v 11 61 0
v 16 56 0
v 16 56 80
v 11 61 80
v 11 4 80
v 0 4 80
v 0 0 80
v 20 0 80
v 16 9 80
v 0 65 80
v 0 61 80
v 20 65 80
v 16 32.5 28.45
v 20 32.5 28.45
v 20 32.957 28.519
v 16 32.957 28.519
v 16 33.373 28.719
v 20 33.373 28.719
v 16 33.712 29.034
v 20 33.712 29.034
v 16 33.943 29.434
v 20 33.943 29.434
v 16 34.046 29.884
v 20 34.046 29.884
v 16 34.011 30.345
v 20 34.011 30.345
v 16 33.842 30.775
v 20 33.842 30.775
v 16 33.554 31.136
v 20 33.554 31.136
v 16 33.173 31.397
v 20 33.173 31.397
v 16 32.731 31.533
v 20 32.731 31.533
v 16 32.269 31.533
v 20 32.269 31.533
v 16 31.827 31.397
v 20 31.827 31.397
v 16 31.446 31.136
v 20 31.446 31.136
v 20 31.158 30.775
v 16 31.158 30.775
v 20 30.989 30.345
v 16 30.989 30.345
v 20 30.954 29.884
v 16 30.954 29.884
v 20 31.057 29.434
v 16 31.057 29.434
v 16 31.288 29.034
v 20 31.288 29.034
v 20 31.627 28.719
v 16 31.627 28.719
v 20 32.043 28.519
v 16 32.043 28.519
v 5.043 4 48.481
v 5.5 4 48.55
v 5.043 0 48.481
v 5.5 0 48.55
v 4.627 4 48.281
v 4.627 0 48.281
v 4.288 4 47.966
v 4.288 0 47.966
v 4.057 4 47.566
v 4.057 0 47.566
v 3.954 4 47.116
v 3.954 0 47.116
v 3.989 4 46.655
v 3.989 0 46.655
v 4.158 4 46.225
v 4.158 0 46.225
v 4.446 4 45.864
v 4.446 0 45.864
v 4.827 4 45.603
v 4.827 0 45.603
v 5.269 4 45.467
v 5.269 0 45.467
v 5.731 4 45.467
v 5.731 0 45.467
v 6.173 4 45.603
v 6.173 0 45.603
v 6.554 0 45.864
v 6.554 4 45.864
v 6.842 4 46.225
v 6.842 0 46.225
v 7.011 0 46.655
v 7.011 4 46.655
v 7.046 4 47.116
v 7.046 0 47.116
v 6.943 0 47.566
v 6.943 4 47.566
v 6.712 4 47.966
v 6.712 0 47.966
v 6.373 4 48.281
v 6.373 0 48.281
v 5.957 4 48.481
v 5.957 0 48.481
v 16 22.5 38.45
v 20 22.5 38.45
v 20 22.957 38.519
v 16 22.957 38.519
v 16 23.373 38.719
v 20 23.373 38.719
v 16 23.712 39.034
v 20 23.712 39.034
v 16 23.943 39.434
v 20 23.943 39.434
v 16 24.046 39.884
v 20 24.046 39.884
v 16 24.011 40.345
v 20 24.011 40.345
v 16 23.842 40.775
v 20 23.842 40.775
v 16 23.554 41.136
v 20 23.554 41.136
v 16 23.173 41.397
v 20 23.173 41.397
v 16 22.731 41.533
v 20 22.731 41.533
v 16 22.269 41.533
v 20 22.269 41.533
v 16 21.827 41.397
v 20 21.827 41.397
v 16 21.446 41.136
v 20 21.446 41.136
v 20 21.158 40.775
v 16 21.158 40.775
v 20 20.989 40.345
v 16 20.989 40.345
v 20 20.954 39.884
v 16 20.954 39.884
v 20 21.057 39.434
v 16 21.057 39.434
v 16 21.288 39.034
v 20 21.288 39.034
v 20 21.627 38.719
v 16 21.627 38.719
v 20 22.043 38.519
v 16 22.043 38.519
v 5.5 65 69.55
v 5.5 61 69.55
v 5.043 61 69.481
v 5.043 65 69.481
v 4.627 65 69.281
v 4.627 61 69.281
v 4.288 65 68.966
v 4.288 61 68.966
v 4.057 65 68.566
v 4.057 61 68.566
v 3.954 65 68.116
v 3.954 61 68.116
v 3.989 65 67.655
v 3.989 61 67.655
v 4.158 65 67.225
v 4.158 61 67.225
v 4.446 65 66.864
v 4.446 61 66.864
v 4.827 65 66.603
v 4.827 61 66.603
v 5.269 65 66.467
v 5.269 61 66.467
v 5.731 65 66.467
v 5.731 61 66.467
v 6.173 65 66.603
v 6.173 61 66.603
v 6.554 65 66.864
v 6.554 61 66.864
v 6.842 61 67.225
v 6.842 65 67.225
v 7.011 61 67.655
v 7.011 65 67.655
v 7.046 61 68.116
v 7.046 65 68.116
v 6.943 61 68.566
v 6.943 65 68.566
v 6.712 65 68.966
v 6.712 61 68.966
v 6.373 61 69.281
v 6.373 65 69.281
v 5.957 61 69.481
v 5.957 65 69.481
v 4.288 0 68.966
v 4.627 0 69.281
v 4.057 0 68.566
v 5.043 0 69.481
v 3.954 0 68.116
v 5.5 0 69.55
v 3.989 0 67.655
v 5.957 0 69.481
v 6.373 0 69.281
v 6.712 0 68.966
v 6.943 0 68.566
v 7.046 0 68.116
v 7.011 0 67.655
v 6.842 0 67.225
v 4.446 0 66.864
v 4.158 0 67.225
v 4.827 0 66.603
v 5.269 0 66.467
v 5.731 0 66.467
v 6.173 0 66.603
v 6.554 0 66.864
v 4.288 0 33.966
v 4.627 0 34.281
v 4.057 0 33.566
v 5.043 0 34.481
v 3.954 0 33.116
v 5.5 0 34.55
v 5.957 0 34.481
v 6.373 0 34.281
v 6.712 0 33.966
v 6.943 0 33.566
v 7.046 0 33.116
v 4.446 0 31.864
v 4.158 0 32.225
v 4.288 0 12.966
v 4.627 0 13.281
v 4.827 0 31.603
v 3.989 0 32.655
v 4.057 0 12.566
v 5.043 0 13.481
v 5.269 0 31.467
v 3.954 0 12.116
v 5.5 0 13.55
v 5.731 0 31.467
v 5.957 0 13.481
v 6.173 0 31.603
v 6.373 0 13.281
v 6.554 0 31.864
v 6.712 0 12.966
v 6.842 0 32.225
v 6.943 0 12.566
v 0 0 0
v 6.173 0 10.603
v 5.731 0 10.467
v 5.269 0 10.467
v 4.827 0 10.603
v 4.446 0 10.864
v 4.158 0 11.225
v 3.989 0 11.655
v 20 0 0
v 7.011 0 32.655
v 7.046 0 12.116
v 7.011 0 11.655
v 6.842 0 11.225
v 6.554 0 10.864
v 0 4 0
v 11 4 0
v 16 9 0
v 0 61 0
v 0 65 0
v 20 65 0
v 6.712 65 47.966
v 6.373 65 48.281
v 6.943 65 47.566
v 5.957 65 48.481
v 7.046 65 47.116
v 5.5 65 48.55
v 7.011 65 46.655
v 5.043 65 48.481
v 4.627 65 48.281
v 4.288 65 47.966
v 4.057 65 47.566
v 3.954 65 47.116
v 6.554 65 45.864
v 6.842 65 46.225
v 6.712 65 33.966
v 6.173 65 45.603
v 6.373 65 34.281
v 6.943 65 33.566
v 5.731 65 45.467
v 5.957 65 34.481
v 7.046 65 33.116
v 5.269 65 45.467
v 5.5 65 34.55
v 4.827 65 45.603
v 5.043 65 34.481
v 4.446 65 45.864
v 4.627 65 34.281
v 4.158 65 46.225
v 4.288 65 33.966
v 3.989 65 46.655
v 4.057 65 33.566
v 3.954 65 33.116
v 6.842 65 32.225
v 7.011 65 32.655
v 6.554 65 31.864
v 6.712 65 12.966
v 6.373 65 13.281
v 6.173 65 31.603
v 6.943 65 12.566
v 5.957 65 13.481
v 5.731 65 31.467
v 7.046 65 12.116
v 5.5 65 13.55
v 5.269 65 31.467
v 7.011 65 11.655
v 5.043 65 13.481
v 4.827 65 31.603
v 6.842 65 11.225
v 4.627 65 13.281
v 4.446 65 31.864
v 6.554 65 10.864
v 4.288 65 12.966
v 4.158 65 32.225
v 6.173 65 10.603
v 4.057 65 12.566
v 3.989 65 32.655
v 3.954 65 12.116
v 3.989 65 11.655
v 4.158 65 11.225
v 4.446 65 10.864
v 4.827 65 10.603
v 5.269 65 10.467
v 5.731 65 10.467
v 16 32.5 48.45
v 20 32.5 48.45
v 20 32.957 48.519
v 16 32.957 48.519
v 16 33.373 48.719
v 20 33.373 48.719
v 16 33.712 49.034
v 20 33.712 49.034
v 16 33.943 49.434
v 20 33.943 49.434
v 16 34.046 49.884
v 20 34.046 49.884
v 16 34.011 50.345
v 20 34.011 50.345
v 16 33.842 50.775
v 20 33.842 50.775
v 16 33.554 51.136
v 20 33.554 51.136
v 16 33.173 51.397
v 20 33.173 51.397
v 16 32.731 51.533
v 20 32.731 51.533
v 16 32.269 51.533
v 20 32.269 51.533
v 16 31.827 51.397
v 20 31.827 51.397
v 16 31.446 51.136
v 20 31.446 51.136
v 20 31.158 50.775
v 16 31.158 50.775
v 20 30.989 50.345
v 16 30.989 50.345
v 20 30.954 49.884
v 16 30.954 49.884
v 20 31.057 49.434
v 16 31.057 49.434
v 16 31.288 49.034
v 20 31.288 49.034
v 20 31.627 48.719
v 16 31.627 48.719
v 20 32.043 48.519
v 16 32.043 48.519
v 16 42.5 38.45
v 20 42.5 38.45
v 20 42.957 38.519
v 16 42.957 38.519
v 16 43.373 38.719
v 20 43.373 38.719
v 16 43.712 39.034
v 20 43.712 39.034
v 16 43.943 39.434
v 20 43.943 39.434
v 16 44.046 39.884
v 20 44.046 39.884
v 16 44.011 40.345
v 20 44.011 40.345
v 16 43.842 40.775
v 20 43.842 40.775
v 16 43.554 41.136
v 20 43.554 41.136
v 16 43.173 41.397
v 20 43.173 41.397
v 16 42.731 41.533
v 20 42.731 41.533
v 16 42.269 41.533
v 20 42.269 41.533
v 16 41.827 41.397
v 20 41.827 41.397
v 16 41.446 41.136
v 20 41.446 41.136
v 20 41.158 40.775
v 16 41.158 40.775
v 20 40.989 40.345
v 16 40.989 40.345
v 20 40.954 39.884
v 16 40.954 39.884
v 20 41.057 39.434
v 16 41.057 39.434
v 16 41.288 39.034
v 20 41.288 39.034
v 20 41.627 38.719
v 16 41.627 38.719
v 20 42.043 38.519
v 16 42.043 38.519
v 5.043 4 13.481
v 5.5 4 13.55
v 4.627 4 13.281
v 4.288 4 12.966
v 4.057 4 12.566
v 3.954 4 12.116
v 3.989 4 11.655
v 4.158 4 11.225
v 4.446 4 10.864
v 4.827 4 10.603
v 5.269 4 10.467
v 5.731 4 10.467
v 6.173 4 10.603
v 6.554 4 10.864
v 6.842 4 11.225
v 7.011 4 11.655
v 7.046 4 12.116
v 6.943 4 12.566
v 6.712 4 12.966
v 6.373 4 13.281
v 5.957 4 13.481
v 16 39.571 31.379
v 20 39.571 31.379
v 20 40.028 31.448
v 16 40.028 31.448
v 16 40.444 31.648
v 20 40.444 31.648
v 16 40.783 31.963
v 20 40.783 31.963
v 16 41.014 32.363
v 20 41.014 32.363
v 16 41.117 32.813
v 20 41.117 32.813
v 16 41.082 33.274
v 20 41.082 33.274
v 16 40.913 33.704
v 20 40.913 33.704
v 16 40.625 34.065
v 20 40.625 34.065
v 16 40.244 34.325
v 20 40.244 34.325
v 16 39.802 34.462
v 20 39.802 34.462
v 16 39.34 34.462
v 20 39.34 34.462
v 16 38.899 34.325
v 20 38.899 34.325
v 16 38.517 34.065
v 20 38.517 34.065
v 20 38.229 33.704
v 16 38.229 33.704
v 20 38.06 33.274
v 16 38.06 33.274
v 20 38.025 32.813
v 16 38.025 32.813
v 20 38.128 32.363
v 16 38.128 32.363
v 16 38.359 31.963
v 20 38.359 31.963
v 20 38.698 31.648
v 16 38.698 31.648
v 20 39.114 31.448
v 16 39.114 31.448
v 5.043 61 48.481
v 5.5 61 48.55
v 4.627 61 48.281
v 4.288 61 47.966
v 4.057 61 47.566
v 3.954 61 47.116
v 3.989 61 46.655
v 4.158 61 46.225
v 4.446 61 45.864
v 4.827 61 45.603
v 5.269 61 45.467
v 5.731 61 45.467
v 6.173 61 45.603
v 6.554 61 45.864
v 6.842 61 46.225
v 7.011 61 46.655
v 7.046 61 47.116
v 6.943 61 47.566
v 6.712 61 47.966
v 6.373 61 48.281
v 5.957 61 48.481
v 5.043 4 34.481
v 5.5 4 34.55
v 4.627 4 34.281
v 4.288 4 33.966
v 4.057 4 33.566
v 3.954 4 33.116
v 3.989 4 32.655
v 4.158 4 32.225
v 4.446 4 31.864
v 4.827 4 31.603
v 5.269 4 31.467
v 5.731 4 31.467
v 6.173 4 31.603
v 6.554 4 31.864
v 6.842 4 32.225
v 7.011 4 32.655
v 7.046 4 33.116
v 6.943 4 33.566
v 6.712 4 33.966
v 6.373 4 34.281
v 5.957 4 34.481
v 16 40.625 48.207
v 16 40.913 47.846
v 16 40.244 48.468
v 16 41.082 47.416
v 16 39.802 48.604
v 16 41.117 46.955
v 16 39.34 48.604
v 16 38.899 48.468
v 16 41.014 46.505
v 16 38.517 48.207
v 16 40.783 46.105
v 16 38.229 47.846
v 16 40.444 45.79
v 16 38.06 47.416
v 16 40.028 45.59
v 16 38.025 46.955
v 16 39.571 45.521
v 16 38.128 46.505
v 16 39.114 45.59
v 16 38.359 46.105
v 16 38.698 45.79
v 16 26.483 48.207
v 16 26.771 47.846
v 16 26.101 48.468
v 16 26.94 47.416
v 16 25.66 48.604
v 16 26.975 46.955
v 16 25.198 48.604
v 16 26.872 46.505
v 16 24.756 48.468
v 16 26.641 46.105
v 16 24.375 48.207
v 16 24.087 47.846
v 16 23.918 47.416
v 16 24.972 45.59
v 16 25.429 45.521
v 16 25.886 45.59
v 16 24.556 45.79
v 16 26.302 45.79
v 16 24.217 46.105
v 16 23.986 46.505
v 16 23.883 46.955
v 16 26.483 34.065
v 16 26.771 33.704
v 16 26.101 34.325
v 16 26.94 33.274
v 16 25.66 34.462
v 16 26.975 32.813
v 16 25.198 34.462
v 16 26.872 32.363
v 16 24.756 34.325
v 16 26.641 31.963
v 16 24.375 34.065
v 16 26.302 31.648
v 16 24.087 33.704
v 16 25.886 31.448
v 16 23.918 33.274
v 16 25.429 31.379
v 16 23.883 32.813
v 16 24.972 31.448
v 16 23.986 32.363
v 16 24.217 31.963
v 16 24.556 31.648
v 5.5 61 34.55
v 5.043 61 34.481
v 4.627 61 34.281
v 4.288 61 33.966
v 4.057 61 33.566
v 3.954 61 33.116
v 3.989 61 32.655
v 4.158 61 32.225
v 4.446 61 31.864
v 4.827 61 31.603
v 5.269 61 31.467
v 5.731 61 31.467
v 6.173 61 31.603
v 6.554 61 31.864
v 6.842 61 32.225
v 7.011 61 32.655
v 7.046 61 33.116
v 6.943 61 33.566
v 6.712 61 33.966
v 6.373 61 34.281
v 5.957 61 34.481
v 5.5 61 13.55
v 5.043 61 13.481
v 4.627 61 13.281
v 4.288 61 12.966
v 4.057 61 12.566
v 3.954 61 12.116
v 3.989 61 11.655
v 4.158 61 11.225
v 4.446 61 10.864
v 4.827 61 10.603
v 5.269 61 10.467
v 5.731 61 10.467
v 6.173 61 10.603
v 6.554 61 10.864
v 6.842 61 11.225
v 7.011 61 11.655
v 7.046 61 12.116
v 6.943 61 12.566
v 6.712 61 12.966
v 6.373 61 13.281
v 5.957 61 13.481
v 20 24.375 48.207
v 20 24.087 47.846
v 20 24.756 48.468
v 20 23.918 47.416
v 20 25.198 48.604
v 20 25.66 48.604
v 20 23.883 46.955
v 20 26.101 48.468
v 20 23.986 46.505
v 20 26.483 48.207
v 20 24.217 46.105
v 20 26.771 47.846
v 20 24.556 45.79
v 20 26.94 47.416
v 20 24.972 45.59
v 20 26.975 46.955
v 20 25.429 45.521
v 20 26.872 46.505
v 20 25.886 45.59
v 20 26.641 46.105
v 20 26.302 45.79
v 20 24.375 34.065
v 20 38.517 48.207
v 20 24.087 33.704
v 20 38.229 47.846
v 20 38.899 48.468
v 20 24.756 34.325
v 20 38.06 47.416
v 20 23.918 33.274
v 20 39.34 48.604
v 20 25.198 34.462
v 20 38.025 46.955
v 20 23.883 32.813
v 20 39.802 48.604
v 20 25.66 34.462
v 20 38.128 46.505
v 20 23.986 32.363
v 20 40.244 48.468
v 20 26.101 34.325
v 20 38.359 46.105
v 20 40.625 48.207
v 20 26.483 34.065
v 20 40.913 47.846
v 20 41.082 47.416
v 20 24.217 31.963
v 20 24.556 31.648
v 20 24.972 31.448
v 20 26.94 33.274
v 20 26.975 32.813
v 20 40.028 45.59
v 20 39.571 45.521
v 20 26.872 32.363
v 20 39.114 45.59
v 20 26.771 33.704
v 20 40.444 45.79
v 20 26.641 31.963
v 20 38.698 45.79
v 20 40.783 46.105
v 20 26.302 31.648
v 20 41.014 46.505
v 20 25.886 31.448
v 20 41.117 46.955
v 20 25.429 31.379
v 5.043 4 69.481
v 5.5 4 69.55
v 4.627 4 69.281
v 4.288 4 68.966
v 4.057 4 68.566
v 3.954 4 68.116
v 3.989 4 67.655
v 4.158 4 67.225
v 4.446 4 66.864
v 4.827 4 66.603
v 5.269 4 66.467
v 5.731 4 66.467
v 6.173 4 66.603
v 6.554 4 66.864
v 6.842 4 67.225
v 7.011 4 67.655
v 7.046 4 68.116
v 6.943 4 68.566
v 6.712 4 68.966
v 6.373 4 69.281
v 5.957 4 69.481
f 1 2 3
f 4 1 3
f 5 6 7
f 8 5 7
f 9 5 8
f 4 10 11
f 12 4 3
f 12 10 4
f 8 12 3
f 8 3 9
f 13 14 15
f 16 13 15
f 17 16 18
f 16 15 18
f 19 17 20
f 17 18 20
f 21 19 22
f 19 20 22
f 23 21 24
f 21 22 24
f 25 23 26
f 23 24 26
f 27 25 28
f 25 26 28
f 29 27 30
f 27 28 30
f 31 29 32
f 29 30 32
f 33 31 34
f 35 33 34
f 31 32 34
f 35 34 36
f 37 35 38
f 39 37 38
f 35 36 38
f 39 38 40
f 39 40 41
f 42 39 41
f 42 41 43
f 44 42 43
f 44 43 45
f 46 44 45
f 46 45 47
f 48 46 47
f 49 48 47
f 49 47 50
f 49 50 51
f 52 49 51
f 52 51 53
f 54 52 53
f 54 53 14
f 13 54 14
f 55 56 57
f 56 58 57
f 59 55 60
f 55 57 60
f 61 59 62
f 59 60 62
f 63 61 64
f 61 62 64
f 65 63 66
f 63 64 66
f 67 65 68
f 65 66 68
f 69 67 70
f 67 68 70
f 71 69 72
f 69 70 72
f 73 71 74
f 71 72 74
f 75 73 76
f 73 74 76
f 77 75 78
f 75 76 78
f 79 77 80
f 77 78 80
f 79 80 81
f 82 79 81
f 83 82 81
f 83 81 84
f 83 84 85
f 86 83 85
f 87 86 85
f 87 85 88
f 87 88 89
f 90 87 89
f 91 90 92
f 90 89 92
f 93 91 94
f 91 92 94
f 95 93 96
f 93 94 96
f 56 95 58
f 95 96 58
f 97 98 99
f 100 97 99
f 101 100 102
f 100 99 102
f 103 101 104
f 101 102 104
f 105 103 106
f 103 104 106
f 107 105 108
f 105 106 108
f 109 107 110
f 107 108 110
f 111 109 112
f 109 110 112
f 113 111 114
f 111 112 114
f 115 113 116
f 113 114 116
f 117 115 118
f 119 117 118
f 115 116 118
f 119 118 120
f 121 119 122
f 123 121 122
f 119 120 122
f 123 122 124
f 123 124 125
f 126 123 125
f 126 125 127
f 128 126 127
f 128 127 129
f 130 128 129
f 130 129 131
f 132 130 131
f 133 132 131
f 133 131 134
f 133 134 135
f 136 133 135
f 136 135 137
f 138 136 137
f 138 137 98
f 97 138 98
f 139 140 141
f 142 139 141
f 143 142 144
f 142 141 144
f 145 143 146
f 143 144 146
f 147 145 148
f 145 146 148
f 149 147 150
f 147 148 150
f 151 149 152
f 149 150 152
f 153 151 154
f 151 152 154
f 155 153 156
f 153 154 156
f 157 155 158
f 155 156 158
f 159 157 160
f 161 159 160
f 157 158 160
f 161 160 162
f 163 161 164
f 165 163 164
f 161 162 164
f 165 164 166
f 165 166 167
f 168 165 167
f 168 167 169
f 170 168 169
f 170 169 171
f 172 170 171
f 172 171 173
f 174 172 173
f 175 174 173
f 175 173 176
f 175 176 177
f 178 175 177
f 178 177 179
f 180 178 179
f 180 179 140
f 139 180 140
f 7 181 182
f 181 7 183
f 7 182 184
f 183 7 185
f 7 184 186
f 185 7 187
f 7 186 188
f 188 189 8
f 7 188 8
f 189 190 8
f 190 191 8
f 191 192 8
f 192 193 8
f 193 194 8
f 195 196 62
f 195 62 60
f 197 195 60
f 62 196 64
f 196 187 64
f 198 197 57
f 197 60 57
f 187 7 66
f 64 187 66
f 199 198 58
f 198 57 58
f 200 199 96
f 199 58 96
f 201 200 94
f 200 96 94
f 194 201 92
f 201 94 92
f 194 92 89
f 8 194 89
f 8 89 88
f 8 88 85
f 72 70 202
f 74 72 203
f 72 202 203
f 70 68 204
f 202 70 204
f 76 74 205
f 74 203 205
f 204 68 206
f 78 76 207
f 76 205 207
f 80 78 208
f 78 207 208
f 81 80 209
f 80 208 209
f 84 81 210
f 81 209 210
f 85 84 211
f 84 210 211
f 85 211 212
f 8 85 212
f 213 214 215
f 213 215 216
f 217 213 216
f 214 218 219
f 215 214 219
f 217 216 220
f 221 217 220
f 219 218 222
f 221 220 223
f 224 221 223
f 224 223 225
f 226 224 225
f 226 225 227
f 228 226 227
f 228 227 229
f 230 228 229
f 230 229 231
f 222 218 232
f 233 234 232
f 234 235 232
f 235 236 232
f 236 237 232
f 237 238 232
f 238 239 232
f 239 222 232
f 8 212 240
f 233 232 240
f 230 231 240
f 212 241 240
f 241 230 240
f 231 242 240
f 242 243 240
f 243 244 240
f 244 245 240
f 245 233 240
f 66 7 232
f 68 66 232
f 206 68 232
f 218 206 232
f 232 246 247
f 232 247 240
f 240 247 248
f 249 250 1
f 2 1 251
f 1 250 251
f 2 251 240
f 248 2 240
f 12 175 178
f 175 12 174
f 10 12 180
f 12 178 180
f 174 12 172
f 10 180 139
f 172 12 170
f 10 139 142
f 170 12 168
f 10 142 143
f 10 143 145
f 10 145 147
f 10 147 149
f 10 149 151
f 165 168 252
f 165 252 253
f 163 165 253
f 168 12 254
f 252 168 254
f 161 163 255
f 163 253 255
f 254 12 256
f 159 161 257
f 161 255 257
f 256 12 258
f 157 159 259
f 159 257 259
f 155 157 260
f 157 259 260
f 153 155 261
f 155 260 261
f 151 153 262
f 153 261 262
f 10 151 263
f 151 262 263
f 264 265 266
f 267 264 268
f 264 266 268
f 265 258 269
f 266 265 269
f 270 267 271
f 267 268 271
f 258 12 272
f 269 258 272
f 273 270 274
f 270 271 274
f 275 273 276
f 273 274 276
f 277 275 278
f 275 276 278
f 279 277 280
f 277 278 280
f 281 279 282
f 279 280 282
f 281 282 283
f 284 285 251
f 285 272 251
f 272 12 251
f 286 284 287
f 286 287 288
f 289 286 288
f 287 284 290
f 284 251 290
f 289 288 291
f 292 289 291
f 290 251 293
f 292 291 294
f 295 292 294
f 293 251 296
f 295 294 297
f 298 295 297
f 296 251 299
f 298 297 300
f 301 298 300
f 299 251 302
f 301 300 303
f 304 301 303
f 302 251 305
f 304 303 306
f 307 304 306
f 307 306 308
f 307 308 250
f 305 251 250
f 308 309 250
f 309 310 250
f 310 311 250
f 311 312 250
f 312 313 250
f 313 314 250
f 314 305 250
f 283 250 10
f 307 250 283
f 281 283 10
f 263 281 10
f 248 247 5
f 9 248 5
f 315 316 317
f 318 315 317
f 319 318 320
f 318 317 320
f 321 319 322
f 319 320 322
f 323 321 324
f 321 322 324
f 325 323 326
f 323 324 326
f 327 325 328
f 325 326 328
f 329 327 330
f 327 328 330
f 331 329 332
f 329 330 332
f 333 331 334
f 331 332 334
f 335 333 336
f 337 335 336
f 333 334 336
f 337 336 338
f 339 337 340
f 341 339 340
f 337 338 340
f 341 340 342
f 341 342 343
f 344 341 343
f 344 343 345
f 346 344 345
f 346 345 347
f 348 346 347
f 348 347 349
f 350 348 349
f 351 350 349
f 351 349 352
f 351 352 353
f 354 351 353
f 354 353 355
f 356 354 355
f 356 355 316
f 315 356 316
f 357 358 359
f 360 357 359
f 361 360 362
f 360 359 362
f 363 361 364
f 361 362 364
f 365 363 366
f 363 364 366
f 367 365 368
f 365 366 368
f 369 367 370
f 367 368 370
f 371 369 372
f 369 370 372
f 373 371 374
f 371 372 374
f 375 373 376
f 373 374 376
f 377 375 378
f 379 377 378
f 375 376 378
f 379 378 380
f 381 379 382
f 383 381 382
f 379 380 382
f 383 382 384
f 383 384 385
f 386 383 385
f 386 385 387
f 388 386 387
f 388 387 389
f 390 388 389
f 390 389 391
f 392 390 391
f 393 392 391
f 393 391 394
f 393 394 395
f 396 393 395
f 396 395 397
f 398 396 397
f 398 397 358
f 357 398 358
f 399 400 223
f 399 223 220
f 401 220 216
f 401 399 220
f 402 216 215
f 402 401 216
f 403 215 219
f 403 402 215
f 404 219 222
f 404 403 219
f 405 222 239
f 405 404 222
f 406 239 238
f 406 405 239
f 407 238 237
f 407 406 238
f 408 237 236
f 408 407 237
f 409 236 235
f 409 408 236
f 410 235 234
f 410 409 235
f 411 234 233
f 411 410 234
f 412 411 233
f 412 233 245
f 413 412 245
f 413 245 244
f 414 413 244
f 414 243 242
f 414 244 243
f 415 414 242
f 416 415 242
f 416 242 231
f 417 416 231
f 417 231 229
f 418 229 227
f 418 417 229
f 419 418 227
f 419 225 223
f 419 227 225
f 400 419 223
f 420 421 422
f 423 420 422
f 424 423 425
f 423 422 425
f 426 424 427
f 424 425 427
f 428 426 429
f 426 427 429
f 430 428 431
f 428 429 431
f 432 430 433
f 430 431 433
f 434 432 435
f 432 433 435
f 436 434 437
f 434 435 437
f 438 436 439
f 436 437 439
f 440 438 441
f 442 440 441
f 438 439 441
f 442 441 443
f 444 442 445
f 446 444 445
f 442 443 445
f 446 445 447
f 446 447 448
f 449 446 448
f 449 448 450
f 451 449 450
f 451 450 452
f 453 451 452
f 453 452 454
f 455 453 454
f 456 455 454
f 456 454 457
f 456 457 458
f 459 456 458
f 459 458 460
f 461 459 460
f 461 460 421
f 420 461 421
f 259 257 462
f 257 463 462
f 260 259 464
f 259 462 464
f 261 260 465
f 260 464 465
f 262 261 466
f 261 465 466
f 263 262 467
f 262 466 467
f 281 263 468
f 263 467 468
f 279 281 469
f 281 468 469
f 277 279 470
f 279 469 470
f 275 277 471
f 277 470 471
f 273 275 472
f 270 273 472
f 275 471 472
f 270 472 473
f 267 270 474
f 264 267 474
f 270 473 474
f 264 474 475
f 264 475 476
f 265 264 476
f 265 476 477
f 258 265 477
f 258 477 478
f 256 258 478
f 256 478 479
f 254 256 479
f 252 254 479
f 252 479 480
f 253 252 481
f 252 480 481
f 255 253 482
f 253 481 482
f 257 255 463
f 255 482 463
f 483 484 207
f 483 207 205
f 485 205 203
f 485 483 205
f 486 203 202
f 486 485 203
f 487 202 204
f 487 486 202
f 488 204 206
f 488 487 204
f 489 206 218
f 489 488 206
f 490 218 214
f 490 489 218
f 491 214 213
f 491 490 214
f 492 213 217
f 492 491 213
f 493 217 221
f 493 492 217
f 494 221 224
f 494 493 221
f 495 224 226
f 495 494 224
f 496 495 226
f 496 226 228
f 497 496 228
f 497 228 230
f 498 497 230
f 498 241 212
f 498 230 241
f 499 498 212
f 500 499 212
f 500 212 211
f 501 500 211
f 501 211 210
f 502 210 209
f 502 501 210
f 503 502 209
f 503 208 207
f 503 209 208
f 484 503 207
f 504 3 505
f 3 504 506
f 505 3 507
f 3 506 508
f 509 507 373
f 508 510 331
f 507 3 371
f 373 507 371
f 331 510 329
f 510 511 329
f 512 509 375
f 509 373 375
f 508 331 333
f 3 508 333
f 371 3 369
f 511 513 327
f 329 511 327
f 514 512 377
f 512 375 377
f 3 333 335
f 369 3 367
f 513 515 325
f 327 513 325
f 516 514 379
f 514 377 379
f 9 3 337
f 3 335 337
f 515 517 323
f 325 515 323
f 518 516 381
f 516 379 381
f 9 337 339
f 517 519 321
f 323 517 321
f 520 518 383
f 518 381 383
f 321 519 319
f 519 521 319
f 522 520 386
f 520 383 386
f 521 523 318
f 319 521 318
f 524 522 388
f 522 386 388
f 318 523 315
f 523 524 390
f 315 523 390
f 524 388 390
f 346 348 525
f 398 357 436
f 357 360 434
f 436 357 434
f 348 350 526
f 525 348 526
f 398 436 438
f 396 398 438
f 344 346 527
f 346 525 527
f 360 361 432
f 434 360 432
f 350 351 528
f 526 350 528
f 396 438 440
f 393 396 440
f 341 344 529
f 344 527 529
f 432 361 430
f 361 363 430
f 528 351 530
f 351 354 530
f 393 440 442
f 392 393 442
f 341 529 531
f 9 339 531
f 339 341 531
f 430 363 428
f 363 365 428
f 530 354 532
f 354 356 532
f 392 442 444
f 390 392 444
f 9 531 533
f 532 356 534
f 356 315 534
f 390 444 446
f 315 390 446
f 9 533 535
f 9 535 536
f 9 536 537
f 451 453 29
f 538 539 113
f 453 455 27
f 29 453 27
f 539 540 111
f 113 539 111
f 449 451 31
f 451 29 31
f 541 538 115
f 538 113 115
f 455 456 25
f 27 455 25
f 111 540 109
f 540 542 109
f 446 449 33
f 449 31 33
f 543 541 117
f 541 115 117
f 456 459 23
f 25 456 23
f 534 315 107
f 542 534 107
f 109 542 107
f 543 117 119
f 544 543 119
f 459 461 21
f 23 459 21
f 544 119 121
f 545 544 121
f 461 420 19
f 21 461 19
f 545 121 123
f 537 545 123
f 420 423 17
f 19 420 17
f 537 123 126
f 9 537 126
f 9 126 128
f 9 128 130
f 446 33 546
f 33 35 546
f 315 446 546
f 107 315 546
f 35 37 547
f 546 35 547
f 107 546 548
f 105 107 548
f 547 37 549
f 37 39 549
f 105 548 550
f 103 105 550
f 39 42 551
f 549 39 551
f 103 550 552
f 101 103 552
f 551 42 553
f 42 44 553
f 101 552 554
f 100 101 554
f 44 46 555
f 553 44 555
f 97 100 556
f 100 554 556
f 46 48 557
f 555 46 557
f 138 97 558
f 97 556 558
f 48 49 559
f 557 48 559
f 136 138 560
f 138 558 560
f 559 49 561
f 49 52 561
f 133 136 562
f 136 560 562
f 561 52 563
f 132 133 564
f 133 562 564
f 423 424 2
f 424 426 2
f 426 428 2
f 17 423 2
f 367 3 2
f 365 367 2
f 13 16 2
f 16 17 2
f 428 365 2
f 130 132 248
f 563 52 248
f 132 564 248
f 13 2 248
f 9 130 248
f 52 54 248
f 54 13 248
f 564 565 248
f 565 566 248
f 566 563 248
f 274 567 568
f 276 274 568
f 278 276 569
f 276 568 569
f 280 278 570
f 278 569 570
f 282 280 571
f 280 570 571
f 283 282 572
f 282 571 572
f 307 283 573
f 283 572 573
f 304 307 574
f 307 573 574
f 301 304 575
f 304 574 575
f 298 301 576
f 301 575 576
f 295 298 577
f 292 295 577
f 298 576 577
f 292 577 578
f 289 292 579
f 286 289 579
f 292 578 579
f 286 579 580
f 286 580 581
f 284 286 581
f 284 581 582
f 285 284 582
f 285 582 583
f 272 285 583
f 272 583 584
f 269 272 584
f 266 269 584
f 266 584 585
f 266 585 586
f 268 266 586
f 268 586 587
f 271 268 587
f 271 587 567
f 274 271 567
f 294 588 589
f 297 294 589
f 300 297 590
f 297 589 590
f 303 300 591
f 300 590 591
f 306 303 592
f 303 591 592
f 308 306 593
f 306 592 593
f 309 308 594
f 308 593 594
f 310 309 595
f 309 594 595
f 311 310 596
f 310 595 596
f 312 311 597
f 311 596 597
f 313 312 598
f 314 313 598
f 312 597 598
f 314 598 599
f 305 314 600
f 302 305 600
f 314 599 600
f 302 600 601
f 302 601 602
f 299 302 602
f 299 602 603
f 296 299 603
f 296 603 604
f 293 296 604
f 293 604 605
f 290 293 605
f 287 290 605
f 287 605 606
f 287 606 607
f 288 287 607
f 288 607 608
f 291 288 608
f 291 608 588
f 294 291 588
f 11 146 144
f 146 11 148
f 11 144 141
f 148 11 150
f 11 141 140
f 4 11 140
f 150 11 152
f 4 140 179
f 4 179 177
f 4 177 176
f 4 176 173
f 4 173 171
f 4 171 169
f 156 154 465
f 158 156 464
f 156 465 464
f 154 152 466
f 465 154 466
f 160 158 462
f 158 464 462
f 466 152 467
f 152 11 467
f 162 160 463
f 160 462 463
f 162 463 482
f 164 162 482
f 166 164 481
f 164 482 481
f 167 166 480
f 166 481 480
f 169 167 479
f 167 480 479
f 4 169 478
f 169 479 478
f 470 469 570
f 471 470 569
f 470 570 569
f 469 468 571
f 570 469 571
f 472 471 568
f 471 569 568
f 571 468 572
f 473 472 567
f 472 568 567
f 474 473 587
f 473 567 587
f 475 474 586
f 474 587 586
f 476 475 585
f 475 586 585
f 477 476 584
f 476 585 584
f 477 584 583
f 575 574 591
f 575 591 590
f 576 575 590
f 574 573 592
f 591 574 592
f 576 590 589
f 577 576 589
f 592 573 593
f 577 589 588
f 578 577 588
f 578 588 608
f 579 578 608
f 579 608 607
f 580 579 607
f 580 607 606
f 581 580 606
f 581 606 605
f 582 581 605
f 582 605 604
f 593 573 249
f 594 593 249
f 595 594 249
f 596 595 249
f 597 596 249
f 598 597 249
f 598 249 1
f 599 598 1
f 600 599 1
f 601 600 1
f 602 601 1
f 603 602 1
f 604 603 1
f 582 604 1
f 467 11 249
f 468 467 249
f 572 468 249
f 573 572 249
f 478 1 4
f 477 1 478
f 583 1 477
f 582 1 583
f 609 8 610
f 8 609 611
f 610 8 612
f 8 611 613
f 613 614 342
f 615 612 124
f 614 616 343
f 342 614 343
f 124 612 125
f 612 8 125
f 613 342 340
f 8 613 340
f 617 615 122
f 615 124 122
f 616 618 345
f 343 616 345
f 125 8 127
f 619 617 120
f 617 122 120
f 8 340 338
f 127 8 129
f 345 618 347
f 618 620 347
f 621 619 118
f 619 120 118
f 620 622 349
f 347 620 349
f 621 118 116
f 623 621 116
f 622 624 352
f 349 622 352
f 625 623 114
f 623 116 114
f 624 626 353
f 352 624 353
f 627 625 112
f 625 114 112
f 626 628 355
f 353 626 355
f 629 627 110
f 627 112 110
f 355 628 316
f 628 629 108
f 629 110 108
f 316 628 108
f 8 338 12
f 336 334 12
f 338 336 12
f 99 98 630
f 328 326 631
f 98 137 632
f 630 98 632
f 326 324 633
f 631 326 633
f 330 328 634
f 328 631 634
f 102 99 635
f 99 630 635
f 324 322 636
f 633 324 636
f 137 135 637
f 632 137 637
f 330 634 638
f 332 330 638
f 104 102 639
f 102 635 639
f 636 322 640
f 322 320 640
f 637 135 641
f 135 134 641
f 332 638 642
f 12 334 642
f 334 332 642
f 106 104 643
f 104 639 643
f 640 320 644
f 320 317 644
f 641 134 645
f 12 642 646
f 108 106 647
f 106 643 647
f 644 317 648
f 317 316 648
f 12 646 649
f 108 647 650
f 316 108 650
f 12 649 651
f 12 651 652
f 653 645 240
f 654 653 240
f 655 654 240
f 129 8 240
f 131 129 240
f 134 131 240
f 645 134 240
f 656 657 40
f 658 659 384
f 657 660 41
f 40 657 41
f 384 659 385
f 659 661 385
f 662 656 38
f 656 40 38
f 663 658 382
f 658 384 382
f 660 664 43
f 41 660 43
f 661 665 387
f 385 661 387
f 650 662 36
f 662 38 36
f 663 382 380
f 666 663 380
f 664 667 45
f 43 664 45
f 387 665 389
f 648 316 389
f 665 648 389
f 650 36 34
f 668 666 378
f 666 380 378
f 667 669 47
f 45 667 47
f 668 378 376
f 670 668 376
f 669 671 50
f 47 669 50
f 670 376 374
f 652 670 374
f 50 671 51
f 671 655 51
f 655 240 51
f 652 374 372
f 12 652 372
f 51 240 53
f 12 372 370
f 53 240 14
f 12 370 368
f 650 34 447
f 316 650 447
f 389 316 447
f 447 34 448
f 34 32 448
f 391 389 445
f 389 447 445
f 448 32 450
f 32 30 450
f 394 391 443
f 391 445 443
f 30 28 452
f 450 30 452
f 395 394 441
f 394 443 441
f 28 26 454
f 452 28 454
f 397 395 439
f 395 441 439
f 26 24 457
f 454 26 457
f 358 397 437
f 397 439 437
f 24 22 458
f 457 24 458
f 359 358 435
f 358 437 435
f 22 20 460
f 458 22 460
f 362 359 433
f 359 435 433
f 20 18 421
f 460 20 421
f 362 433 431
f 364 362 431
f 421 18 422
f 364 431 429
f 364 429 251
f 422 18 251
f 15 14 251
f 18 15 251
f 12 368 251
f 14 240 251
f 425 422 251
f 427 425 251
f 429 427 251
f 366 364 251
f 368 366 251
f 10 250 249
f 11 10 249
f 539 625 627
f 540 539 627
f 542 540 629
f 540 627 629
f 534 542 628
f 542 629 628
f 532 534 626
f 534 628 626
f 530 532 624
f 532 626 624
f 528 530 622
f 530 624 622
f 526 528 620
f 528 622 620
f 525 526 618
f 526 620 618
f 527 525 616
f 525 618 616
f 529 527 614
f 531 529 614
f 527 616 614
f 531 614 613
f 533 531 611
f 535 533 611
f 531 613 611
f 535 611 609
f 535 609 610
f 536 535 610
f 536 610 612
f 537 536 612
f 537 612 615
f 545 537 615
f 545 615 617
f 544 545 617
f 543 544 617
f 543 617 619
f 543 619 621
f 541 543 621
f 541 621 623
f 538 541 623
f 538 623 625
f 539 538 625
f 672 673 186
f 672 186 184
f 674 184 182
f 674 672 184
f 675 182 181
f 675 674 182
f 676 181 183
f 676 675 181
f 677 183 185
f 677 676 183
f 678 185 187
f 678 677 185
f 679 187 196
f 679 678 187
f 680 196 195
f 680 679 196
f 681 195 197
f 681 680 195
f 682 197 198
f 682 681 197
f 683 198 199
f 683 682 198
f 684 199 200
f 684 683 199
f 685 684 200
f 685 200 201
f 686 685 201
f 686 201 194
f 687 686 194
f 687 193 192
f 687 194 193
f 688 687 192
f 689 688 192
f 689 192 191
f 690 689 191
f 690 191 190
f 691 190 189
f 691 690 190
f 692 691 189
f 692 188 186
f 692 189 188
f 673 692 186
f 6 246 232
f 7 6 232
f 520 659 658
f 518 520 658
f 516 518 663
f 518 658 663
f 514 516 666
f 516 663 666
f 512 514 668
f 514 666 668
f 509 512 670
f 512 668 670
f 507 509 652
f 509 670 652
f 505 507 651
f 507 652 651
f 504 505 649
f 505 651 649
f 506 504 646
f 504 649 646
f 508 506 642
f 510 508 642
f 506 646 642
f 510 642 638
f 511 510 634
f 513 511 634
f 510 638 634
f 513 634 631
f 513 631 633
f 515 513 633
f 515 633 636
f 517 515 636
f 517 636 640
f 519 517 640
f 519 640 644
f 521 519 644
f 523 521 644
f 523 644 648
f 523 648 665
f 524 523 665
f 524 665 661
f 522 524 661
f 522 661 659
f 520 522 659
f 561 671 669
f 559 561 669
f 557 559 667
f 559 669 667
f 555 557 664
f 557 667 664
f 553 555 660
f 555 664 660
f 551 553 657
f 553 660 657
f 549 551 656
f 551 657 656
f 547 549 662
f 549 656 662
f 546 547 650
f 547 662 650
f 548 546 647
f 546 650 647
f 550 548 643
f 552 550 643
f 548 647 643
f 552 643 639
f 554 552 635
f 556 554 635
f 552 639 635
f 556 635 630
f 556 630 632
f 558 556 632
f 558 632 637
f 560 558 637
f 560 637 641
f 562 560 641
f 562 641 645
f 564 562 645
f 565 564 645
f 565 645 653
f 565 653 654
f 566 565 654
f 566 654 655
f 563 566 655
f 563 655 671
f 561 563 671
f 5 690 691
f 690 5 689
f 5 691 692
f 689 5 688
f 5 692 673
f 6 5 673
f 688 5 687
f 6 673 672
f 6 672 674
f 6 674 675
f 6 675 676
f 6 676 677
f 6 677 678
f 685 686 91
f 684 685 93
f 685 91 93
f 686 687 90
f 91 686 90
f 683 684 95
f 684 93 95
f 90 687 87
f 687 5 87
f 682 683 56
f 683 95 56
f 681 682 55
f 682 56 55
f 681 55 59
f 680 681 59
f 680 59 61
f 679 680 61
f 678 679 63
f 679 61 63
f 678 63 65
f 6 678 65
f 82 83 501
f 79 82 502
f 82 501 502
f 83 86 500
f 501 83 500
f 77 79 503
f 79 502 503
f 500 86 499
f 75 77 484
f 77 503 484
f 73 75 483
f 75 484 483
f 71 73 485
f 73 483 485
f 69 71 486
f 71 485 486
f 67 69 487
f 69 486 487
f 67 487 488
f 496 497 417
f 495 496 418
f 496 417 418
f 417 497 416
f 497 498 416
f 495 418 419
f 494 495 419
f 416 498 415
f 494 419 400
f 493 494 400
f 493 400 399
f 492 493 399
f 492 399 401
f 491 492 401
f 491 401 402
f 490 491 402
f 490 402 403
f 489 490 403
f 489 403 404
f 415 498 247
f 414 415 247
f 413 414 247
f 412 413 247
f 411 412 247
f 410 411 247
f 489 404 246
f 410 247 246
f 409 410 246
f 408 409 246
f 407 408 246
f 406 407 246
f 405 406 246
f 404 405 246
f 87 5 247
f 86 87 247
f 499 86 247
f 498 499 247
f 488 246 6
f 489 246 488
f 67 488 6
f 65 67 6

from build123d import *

# Parameters (mm, degrees)
EXTRUDE_1_DEPTH     = 80
CHAMFER_1_SIZE      = 5
SKETCH_2_R          = 1.55
CUT_EXTRUDE_1_DEPTH = 250
SKETCH_3_R          = 1.55
CUT_EXTRUDE_2_DEPTH = 106


with BuildPart() as part:
    # 草图1 → 拉伸-薄壁1 (new body)
    with BuildSketch(Plane.XY):
        Polygon((0, 0), (20, 0), (20, 65), (0, 65), (0, 61), (16, 61), (16, 4), (0, 4), align=None)
    extrude(amount=EXTRUDE_1_DEPTH)

    # 倒角1
    chamfer_1_edges = [part.edges().sort_by_distance(p)[0] for p in [
        (16, 4, 40),
        (16, 61, 40),
    ]]
    chamfer(chamfer_1_edges, length=CHAMFER_1_SIZE)

    # 草图2 → 切除-拉伸1 (cut, symmetric)
    with BuildSketch(Plane.XZ.offset(-61)):
        with Locations(Location((5.5, 12, 0), (0, 0, 90))):
            Circle(SKETCH_2_R)
        with Locations(Location((5.5, 68, 0), (0, 0, 90))):
            Circle(SKETCH_2_R)
        with Locations(Location((5.5, 33, 0), (0, 0, 90))):
            Circle(SKETCH_2_R)
        with Locations(Location((5.5, 47, 0), (0, 0, 90))):
            Circle(SKETCH_2_R)
    extrude(amount=CUT_EXTRUDE_1_DEPTH, both=True, mode=Mode.SUBTRACT)

    # 草图3 → 切除-拉伸2 (cut, through all)
    with BuildSketch(Plane(origin=(20, 0, 0), x_dir=(0, 0, -1), z_dir=(1, 0, 0))):
        with Locations((-40, 42.5)):
            Circle(SKETCH_3_R)
        with Locations((-32.928932188, 39.571067812)):
            Circle(SKETCH_3_R)
        with Locations((-30, 32.5)):
            Circle(SKETCH_3_R)
        with Locations((-32.928932188, 25.428932188)):
            Circle(SKETCH_3_R)
        with Locations((-40, 22.5)):
            Circle(SKETCH_3_R)
        with Locations((-47.071067812, 25.428932188)):
            Circle(SKETCH_3_R)
        with Locations((-50, 32.5)):
            Circle(SKETCH_3_R)
        with Locations((-47.071067812, 39.571067812)):
            Circle(SKETCH_3_R)
    extrude(amount=-CUT_EXTRUDE_2_DEPTH, mode=Mode.SUBTRACT)


solid = part.part
